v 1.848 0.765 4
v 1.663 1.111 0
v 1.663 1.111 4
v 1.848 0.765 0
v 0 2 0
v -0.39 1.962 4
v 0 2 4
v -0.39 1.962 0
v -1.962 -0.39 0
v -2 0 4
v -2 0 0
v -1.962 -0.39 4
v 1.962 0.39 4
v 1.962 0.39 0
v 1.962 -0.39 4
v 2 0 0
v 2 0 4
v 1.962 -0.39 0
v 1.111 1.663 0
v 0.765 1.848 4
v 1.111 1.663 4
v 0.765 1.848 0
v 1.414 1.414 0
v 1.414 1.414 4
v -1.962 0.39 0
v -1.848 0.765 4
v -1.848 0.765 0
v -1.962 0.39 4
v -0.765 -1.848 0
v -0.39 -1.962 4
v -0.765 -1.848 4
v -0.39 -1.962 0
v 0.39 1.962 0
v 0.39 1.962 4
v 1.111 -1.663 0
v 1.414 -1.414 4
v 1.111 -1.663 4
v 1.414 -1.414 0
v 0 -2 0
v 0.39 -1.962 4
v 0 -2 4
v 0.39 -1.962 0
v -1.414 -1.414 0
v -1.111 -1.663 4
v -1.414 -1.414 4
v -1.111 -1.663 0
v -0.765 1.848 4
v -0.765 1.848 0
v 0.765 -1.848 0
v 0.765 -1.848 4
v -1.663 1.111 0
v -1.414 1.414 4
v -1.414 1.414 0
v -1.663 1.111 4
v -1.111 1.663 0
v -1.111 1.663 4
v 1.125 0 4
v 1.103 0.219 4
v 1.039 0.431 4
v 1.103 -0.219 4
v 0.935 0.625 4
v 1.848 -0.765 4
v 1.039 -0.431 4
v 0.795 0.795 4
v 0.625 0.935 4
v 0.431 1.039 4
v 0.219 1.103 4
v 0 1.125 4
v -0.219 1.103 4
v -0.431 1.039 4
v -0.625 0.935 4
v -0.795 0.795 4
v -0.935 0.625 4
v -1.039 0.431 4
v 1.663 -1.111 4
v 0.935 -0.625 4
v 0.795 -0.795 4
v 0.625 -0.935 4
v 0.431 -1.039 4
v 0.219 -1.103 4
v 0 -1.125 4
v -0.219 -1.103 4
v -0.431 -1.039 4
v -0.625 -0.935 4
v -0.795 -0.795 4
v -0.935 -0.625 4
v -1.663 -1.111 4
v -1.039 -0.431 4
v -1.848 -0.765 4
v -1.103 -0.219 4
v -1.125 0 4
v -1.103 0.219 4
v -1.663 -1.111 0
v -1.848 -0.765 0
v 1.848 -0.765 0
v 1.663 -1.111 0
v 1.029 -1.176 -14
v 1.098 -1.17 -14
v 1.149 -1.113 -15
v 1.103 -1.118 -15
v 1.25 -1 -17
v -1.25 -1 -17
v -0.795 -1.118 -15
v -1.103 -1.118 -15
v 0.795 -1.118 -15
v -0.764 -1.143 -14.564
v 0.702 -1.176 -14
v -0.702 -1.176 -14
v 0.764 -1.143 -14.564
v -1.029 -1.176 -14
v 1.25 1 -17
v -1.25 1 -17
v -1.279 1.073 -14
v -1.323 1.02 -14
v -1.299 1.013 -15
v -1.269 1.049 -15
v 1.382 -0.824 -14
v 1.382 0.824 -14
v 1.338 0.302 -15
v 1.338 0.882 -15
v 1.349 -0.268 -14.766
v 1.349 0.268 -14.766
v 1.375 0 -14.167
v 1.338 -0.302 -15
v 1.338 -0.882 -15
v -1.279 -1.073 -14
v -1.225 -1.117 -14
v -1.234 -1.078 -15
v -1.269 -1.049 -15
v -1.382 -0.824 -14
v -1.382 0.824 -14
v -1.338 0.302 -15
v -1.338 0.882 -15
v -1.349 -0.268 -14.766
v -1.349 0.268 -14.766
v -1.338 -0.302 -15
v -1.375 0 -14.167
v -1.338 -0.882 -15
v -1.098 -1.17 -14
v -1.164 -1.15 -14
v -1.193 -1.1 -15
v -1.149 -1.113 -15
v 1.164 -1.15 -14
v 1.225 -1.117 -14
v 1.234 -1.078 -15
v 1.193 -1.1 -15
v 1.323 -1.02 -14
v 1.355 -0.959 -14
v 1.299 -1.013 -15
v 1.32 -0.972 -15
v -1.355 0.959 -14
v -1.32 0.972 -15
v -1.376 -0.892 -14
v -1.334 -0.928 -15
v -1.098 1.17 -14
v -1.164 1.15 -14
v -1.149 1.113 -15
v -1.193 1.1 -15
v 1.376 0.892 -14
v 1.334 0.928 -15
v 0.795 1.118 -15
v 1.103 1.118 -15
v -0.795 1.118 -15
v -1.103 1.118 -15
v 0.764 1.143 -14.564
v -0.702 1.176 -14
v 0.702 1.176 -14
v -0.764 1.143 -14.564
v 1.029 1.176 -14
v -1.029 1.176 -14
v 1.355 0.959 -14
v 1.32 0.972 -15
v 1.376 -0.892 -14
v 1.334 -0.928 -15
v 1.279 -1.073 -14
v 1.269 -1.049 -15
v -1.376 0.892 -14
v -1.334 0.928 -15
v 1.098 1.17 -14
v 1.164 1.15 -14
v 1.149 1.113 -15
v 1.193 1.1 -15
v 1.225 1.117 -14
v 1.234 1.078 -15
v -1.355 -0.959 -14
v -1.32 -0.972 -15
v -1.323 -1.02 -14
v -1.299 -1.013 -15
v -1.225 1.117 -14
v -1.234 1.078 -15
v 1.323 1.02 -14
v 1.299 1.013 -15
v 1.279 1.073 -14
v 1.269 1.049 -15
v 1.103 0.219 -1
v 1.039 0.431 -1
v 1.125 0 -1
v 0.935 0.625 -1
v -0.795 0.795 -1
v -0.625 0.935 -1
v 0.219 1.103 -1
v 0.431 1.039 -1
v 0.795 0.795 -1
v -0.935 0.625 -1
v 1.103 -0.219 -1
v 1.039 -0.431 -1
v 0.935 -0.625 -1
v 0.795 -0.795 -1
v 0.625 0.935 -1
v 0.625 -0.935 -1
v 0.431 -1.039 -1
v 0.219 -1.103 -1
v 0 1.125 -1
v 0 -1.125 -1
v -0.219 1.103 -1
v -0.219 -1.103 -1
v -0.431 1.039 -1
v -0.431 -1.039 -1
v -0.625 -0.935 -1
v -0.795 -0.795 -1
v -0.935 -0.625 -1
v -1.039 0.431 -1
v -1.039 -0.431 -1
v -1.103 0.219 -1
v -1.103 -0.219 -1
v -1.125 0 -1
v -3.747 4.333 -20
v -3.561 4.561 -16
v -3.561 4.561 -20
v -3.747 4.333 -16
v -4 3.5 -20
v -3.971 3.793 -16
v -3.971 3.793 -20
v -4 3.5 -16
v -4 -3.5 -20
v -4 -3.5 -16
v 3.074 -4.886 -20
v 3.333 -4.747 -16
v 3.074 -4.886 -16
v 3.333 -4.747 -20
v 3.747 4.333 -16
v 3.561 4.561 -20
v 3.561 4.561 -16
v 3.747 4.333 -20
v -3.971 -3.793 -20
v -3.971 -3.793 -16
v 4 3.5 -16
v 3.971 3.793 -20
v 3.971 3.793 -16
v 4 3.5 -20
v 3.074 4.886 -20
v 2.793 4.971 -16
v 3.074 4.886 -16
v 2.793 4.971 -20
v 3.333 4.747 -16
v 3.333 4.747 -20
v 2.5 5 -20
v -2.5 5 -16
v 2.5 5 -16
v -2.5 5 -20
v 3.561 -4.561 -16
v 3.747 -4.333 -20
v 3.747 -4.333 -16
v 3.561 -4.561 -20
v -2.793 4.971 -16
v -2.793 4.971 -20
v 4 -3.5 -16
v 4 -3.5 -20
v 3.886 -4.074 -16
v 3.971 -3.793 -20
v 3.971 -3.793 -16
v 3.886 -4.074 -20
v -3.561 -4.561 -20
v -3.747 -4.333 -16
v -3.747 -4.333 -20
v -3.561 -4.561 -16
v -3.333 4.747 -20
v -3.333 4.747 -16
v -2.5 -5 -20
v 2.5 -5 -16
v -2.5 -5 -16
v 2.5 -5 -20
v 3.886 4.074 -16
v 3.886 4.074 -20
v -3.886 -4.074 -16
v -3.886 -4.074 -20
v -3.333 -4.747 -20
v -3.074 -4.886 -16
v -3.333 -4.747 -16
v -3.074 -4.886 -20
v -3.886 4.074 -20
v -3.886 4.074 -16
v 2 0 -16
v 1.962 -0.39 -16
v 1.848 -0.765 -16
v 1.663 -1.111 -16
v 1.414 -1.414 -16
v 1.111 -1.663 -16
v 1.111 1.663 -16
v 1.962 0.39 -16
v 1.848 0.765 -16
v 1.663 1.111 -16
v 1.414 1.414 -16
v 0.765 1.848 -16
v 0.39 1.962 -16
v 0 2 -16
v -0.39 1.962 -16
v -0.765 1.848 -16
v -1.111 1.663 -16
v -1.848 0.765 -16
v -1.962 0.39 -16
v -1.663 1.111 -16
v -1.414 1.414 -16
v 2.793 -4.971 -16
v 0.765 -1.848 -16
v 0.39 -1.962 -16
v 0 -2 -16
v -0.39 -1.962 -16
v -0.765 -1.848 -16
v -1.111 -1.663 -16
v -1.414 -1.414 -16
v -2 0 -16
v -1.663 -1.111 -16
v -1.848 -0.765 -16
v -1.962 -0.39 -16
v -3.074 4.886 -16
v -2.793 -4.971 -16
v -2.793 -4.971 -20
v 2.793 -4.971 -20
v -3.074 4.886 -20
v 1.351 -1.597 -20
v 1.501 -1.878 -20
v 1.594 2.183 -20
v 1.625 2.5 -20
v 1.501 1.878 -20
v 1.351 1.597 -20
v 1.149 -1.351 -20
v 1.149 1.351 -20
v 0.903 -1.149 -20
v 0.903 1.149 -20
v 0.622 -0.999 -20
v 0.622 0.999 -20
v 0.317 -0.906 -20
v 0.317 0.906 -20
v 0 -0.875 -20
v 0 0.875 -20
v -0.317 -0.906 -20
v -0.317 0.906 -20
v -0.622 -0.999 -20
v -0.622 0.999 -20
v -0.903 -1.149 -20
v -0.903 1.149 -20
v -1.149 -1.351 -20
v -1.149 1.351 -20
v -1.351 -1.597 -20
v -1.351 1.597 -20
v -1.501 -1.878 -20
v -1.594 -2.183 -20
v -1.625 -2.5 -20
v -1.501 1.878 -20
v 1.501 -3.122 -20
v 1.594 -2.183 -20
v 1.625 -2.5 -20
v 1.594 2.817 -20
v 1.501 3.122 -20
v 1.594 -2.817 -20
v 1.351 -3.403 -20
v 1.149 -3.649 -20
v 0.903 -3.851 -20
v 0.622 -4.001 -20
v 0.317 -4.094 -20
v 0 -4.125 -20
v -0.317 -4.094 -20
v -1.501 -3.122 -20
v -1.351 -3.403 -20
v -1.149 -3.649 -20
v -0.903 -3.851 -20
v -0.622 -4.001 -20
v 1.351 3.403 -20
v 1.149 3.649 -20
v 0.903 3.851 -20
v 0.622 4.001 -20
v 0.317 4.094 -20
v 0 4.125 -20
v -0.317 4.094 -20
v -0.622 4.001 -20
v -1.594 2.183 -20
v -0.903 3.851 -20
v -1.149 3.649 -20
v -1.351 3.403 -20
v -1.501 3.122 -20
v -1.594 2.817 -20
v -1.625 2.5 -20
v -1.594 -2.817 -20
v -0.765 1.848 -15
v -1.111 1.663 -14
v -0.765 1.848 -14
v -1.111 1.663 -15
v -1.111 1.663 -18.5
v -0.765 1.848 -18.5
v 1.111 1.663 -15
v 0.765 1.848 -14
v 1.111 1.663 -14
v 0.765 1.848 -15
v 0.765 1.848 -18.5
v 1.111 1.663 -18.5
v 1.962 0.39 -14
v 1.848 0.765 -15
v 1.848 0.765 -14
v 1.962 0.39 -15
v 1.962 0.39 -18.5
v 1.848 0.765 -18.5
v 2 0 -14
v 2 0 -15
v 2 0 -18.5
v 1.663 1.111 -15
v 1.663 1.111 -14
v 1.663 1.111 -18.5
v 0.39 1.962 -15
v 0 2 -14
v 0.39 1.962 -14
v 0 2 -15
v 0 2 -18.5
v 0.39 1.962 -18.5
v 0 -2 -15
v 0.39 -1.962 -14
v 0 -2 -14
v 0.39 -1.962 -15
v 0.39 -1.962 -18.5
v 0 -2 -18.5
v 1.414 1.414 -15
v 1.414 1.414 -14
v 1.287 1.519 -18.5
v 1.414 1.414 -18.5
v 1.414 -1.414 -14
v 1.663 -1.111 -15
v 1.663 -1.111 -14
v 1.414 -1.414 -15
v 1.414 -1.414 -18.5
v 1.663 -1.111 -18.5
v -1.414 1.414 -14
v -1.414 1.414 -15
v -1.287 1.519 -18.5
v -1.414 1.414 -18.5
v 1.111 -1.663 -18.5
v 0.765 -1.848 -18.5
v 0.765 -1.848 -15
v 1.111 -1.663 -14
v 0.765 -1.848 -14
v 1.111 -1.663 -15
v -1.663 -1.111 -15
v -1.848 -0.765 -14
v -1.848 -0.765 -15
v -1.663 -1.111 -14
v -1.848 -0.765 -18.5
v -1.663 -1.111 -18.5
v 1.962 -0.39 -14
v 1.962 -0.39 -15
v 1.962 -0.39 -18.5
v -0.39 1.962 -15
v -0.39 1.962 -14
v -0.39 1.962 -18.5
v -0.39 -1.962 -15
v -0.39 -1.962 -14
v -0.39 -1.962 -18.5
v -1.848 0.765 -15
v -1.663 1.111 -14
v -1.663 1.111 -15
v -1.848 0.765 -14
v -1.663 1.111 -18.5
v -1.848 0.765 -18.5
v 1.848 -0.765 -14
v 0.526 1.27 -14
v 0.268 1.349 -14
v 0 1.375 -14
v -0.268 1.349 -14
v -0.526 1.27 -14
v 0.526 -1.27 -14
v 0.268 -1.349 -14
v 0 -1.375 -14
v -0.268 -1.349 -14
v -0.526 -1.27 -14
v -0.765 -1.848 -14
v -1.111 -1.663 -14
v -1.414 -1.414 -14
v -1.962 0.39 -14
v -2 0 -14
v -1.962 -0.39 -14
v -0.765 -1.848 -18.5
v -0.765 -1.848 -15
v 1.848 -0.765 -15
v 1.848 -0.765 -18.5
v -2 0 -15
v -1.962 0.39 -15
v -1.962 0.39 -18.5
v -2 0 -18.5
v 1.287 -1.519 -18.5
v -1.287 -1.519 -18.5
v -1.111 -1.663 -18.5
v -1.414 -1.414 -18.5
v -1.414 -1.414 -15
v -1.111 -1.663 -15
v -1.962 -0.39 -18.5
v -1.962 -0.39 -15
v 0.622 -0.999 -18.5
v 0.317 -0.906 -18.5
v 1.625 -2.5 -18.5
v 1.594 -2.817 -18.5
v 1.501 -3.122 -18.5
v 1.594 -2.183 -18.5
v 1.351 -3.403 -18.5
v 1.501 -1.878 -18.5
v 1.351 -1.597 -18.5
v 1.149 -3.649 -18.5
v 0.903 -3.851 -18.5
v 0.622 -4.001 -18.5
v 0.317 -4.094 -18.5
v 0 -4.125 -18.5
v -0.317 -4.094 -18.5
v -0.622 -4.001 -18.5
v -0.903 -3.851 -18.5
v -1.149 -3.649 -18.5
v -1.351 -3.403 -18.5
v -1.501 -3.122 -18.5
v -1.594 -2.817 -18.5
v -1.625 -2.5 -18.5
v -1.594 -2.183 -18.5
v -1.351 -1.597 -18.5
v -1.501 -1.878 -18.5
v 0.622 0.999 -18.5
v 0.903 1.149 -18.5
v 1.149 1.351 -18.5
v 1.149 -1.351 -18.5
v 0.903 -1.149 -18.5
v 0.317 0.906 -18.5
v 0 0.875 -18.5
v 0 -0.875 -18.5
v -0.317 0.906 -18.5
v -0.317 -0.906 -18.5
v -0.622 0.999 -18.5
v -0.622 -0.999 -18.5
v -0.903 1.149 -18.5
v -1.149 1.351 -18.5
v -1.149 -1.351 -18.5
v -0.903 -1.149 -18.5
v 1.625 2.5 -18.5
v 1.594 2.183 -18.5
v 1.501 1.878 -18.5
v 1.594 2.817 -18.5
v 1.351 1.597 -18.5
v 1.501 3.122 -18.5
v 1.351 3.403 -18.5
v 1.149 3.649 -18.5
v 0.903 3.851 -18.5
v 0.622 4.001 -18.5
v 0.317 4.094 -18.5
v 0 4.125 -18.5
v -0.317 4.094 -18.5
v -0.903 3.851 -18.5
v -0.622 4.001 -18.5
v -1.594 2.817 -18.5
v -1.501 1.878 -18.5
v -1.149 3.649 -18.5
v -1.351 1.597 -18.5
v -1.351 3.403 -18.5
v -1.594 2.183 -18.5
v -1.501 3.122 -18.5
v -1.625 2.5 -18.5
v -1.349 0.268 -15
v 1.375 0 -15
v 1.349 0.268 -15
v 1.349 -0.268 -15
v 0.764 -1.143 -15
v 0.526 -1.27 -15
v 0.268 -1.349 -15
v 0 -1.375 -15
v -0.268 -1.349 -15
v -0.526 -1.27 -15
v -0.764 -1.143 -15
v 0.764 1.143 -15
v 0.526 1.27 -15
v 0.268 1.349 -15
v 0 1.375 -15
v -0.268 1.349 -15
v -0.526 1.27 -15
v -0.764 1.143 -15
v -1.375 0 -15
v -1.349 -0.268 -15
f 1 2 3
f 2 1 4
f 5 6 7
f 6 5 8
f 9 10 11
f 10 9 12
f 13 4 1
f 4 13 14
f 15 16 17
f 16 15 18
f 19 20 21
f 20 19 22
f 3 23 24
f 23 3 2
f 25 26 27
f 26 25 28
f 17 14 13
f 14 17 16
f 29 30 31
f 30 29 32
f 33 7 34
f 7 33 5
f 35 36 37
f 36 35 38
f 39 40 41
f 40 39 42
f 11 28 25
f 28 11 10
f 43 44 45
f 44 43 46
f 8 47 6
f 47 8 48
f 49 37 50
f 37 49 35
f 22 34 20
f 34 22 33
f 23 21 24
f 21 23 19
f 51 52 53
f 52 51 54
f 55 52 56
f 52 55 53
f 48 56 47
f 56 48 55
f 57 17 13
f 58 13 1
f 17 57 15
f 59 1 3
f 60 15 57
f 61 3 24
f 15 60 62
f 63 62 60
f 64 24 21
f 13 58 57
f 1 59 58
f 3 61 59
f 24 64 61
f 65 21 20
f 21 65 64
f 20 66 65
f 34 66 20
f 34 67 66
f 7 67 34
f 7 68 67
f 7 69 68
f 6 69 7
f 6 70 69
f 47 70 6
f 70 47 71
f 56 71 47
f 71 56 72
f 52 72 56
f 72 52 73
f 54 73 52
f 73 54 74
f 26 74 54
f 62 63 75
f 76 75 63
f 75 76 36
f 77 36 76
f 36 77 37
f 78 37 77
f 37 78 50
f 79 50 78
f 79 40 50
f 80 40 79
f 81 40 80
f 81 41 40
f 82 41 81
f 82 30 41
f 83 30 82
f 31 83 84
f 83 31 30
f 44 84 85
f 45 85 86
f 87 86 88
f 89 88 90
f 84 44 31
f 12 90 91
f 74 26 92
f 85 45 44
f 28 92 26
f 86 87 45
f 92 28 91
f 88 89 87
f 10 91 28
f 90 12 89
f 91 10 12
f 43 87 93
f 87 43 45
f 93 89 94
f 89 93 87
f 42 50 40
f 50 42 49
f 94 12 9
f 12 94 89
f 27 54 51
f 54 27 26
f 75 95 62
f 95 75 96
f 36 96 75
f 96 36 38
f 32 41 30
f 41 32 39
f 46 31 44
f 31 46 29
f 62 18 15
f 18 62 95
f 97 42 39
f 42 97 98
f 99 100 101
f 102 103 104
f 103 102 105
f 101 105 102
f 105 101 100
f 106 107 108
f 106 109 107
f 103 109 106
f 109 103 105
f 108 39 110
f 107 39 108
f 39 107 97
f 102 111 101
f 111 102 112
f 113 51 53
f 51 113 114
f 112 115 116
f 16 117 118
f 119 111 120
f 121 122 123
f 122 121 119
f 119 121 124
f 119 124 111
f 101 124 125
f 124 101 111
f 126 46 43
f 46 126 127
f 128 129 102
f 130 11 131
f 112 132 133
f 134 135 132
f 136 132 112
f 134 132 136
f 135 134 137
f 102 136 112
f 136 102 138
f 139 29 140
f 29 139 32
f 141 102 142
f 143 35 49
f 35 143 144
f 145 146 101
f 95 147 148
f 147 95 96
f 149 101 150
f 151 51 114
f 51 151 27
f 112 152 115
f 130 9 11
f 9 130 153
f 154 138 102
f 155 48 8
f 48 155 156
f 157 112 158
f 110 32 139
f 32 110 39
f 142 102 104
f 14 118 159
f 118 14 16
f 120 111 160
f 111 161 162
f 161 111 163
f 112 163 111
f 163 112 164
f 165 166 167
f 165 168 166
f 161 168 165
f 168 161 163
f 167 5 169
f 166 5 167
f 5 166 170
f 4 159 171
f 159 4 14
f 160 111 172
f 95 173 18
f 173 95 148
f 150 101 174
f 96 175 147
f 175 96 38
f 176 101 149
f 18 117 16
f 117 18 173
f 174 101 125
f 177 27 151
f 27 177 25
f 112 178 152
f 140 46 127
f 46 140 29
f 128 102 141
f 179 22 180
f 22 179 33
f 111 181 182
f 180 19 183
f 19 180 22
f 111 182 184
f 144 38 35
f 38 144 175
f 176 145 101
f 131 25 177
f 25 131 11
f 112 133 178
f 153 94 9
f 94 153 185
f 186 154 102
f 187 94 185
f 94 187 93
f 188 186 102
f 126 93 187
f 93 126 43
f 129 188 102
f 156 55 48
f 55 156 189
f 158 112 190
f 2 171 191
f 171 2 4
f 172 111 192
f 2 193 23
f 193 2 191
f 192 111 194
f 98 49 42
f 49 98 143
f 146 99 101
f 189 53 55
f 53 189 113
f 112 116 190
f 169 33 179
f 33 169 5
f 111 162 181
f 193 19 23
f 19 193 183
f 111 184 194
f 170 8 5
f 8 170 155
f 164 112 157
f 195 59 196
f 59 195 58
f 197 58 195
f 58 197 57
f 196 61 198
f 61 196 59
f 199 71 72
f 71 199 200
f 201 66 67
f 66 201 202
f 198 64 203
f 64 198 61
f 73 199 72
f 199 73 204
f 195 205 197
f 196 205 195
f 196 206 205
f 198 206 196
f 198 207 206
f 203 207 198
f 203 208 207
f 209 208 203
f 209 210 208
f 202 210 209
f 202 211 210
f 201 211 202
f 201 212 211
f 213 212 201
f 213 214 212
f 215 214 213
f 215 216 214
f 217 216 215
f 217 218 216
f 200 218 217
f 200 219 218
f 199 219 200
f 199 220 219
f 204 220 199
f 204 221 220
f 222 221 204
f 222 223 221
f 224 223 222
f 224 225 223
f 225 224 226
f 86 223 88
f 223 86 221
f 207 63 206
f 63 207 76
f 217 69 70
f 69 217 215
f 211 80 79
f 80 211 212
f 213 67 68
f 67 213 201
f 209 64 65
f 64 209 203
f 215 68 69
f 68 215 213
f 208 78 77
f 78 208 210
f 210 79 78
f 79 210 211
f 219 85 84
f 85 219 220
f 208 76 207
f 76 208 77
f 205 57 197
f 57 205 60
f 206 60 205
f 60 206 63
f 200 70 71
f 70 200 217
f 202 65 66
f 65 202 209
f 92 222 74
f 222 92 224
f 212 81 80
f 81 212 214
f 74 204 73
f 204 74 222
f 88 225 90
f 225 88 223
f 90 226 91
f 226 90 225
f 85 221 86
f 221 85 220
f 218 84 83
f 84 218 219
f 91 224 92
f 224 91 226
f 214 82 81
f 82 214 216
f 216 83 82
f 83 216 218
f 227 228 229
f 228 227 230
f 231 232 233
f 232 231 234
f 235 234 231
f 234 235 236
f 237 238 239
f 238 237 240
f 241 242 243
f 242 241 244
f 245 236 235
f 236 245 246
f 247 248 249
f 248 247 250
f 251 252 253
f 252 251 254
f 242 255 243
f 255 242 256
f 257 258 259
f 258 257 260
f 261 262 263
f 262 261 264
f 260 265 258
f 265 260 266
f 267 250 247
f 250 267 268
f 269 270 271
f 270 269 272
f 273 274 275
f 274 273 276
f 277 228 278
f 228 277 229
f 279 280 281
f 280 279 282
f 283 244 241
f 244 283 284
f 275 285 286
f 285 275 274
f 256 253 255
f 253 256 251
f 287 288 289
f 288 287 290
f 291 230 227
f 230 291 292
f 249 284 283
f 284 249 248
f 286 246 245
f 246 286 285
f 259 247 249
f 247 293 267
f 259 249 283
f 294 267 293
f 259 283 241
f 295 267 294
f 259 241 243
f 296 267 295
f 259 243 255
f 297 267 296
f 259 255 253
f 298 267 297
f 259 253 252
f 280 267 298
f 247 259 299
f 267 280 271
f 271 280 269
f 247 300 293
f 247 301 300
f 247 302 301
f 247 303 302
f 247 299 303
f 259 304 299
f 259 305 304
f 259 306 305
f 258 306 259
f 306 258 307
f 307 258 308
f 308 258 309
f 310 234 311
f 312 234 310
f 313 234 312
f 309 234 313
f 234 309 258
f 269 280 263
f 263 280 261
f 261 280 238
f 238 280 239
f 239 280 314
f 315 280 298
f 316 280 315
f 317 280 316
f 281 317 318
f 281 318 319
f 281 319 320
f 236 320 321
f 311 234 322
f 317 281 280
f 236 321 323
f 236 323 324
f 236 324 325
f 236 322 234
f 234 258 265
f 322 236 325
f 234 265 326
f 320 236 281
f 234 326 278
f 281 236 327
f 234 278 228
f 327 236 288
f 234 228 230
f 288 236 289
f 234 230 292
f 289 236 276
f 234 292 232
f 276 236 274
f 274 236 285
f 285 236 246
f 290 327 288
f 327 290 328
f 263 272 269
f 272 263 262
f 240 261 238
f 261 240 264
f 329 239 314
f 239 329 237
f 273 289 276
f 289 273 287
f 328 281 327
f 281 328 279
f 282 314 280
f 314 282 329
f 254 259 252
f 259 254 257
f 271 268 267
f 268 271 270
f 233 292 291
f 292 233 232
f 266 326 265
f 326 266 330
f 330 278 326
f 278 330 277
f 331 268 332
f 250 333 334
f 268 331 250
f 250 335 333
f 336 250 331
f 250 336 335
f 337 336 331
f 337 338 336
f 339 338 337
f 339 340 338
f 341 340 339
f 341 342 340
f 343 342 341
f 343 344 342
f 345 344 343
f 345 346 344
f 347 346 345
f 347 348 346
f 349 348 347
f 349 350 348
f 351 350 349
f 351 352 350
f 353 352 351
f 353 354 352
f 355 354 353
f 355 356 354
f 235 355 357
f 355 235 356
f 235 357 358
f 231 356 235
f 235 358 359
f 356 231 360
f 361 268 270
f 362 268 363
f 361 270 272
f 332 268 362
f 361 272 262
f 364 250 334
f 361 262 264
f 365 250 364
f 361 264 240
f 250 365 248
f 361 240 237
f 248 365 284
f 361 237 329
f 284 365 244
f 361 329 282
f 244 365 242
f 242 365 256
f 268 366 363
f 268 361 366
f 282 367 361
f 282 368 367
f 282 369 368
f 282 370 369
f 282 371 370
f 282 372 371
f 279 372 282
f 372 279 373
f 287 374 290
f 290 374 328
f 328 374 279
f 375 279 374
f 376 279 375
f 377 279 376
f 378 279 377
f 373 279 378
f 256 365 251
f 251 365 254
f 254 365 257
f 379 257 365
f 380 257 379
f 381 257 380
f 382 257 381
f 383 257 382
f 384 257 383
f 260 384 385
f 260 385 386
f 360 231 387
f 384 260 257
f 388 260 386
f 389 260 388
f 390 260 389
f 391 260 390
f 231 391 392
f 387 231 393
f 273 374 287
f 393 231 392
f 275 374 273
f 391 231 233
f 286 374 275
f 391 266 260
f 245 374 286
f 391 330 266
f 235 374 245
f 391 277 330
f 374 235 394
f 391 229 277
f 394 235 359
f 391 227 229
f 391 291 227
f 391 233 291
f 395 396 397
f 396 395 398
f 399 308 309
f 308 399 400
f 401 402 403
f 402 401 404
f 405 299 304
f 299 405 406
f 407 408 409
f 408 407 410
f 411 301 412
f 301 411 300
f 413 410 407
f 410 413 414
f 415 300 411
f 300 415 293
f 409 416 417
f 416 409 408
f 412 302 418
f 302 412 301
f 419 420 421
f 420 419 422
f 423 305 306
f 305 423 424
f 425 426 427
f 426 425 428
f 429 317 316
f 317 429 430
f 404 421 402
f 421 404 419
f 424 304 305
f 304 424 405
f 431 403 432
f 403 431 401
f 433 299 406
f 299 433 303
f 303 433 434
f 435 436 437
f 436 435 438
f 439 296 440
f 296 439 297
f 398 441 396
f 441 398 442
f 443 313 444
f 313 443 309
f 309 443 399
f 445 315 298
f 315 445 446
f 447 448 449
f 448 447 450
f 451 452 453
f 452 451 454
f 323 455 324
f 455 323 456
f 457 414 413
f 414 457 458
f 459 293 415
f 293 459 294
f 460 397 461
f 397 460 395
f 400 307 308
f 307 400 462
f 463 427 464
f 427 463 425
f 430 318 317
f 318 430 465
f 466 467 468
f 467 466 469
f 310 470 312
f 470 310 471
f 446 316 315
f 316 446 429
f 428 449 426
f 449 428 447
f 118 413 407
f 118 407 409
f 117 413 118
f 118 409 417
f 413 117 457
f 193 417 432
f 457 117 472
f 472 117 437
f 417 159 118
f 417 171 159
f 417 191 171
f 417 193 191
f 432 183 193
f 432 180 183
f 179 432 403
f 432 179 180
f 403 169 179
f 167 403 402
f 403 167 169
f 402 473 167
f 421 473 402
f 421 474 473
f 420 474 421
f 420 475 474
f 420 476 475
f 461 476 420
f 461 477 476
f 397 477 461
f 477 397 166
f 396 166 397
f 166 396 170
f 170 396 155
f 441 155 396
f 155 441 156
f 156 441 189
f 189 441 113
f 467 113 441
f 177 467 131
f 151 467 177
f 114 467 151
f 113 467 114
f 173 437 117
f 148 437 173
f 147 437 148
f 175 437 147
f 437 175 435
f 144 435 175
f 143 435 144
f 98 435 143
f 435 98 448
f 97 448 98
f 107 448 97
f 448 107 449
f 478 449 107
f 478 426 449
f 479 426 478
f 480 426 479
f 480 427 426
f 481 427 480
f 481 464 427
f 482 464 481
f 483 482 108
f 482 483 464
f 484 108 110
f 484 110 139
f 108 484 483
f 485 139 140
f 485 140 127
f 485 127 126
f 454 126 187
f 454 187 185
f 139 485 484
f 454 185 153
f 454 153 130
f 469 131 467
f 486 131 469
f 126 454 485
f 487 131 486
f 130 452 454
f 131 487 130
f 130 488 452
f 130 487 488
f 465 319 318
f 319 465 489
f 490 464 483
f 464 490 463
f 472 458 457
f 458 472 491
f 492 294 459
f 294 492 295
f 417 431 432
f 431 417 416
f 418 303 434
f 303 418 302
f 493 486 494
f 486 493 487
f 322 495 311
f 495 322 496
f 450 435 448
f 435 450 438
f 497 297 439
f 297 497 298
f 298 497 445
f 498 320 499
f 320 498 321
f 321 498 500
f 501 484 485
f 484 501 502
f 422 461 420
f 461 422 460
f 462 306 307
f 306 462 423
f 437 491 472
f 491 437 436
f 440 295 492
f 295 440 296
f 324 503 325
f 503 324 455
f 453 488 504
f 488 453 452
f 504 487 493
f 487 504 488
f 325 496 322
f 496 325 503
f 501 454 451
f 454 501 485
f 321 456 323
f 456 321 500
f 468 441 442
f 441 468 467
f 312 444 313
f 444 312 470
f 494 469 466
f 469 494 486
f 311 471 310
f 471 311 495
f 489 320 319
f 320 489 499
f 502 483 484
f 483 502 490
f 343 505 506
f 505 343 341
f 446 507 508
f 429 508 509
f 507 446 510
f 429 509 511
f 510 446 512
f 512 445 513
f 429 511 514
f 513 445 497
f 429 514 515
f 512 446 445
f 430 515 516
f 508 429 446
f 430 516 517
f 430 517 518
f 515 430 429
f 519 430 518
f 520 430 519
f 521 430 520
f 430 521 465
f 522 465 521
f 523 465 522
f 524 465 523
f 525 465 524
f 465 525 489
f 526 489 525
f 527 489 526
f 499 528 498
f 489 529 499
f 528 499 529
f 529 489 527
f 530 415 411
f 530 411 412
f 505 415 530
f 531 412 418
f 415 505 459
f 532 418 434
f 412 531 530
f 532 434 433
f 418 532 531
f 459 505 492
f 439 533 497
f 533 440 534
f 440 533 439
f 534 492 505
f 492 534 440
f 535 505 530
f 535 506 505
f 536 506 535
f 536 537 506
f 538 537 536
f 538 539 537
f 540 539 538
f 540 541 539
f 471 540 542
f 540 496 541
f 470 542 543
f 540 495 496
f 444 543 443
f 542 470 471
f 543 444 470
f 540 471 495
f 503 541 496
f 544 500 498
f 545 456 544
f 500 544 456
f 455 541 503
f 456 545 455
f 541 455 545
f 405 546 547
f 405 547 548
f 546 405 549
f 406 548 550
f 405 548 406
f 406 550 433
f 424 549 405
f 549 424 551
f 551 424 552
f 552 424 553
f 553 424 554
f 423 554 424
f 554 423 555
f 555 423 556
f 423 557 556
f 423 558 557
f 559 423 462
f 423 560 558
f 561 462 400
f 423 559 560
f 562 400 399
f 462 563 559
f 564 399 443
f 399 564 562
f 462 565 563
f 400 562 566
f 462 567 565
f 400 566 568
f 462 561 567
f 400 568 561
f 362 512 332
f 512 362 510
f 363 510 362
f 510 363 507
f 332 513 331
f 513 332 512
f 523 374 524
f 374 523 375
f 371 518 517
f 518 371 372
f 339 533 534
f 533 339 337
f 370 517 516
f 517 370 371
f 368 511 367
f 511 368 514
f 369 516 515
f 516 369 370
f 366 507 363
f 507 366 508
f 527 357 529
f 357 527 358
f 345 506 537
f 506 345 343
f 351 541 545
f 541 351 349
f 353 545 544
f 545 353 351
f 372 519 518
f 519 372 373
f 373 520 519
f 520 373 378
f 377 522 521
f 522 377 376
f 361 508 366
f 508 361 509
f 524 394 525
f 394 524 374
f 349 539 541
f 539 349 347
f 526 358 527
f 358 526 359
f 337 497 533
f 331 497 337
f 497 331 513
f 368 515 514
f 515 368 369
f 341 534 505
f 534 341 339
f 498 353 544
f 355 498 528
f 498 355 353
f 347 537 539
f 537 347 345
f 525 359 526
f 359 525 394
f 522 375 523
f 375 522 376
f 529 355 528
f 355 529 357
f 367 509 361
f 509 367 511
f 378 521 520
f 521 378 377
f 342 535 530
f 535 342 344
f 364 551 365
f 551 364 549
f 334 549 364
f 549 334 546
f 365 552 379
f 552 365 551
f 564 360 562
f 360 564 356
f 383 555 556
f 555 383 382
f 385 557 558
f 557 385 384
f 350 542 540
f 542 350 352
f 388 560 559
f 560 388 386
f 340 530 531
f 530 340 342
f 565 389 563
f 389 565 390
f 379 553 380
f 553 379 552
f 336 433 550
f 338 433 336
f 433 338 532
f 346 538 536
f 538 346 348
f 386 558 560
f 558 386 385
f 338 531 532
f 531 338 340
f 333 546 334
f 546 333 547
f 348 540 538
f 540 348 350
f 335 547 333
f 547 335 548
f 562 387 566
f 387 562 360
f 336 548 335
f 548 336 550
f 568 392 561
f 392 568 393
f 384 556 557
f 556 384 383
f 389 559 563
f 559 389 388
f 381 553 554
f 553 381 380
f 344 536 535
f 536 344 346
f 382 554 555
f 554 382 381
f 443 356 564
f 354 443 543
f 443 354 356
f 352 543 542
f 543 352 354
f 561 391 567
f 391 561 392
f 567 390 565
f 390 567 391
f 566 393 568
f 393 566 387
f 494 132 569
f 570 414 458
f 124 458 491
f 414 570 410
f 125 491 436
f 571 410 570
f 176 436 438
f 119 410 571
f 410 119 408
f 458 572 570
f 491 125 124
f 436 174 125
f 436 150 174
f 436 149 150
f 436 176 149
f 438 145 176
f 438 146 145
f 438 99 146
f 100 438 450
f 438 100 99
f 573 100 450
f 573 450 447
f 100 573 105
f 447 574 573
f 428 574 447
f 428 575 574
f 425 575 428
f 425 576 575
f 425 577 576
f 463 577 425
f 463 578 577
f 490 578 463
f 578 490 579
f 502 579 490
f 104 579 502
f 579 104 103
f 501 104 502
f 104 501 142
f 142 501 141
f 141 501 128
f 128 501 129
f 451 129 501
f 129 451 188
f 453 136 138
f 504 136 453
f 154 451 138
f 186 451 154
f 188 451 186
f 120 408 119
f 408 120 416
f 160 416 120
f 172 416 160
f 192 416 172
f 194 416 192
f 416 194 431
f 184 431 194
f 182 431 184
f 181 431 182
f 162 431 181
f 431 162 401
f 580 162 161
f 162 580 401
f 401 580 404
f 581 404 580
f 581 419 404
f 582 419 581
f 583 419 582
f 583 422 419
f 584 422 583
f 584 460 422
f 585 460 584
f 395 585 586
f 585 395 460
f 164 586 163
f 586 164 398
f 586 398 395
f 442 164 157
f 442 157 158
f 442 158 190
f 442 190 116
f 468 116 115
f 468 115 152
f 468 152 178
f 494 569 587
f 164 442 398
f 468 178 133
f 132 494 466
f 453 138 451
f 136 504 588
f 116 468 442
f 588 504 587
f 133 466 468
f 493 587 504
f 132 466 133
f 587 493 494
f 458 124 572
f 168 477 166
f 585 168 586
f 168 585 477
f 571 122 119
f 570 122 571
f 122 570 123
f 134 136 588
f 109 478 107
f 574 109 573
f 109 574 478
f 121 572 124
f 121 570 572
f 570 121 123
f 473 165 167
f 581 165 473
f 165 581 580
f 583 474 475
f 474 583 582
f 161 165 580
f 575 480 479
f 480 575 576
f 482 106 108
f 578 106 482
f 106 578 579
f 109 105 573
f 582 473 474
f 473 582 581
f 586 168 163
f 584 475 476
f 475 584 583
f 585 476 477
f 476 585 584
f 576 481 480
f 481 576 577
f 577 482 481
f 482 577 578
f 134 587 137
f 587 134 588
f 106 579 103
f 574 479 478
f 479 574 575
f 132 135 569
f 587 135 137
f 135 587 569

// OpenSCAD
// file: config_10cm.scad
// ============================================
// NuiBone - 10cm版 共通設定ファイル
// ============================================
// 10cmぬいぐるみ用ロボット骨格の寸法設定
// ※サーボはSG90では大きすぎるため、
//   より小型のサーボを推奨
// ============================================

// --- ぬいぐるみサイズ制約 ---
nui_height = 100;        // ぬいぐるみ全高 (mm)
nui_body_width = 28;     // 胴体最大幅 (mm)
nui_body_depth = 18;     // 胴体最大厚み (mm)

// --- 骨格寸法 ---
bone_thickness = 2.0;    // 骨格基本厚み (mm)
bone_width = 2.5;        // 骨格基本幅 (mm)

// 胴体フレーム
body_height = 30;        // 胴体高さ (mm)
body_width = 24;         // 胴体幅 (mm)
body_depth = 14;         // 胴体奥行き (mm)

// 肩
shoulder_width = 6;      // 肩部品幅 (mm)
shoulder_offset = 10;    // 肩の高さ位置（胴体上端から）

// 腕
arm_length = 22;         // 腕の長さ (mm)
arm_width = 3;           // 腕の幅 (mm)
arm_thickness = 1.5;     // 腕の厚み (mm)

// 足
foot_width = 8;          // 足幅 (mm)
foot_length = 10;        // 足長さ (mm)
foot_height = 4;         // 足高さ (mm)
leg_length = 20;         // 脚の長さ (mm)

// --- サーボ選択 ---
// 10cm版では以下のいずれかを推奨:
// 1. SG51R (5g) - 最小クラス
// 2. HK-5320 (3.7g) - 超小型
// 3. 自作リニアアクチュエータ

// SG51R寸法 (参考)
servo_width = 6.0;       // サーボ幅 (mm)
servo_height = 15.0;     // サーボ高さ (mm)
servo_depth = 12.0;      // サーボ奥行き (mm)
servo_shaft_height = 3;  // 出力軸高さ (mm)
servo_shaft_dia = 3.0;   // 出力軸直径 (mm)

// --- 代替案: 振動モーター版 ---
// サーボの代わりに偏心モーターで「ぷるぷる」動作
vibration_motor_dia = 6; // 振動モーター直径 (mm)
vibration_motor_len = 12;// 振動モーター長さ (mm)

// --- 磁石・重り（10cm版用）---
magnet_dia = 3;          // ネオジム磁石直径 (mm) - より小さい
magnet_height = 1.5;     // ネオジム磁石高さ (mm)
weight_hole_dia = 4;     // 重り穴直径 (mm)

// --- 呼吸機構（10cm版）---
breath_stroke = 2;       // 呼吸ストローク (mm)
breath_plate_size = 10;  // 呼吸プレートサイズ (mm)

// --- 印刷設定 ---
wall_thick = 0.8;        // 壁厚み (mm) - より薄く
tolerance = 0.25;        // 組み立て公差 (mm)
$fn = 32;                // 円の分割数

// --- 色設定（プレビュー用）---
color_bone = [0.9, 0.9, 0.85];
color_servo = [0.2, 0.2, 0.3];
color_magnet = [0.7, 0.7, 0.7];

// ============================================
// 10cm版の制約と推奨事項
// ============================================
//
// 【課題】
// - SG90 (12.2mm幅) は10cmぬいぐるみには大きすぎる
// - 電池も単3では大きい
//
// 【推奨構成】
// 1. マイクロサーボ版
//    - サーボ: SG51R または HK-5320
//    - 電源: LiPo 1S (3.7V) 100-200mAh
//    - 制御: ESP32-C3 または Seeed XIAO
//
// 2. 振動モーター版（簡易版）
//    - 振動モーター × 2-3個
//    - 「ぷるぷる」動作で生命感を表現
//    - サーボ制御不要で省スペース
//
// 3. SMA (形状記憶合金) 版
//    - 超薄型で柔軟
//    - ゆっくりした動きに最適
//    - 呼吸表現に理想的
// ============================================
// main file
// ============================================
// NuiBone - 10cm版 足パーツ
// ============================================
// 小型磁石と重りで直立補助
// ============================================

include <config_10cm.scad>

// --- 足アセンブリ（10cm版）---
module foot_assembly_10cm() {
    // 脚部
    leg_bone_10cm();

    // 足裏
    translate([0, 0, -leg_length])
        foot_base_10cm();
}

// --- 脚ボーン（10cm版）---
module leg_bone_10cm() {
    difference() {
        union() {
            // 股関節接続部
            cylinder(h=4, d=4);

            // 脚本体
            hull() {
                cylinder(h=2, d=4);
                translate([0, 0, -leg_length + foot_height])
                    cube([bone_width, bone_thickness, 2], center=true);
            }
        }

        // 股関節穴
        translate([0, 0, -1])
            cylinder(h=6, d=2 + tolerance);
    }
}

// --- 足裏ベース（10cm版）---
module foot_base_10cm() {
    magnet_count = 2;  // 片足あたりの磁石数

    difference() {
        union() {
            // 足裏本体（丸みを帯びた形状）
            hull() {
                translate([-foot_width/2 + 1.5, -foot_length/2 + 1.5, 0])
                    cylinder(h=foot_height, r=1.5);
                translate([foot_width/2 - 1.5, -foot_length/2 + 1.5, 0])
                    cylinder(h=foot_height, r=1.5);
                translate([-foot_width/2 + 1.5, foot_length/2 - 1.5, 0])
                    cylinder(h=foot_height, r=1.5);
                translate([foot_width/2 - 1.5, foot_length/2 - 1.5, 0])
                    cylinder(h=foot_height, r=1.5);
            }

            // 脚接続ボス
            translate([0, 0, foot_height])
                cylinder(h=2, d=bone_width + 1.5);
        }

        // 磁石穴（前後に2個）
        for (y = [-foot_length/4, foot_length/4]) {
            translate([0, y, -0.5])
                cylinder(h=magnet_height + 0.5, d=magnet_dia + tolerance);
        }

        // 重り穴（中央）
        translate([0, 0, magnet_height])
            cylinder(h=foot_height - magnet_height + 1, d=weight_hole_dia);

        // 脚接続穴
        translate([0, 0, foot_height - 1])
            cylinder(h=4, d=bone_width + tolerance);
    }
}

// --- 足裏（磁石1個版）---
// さらに小さいぬいぐるみ用
module foot_base_10cm_single_magnet() {
    difference() {
        union() {
            // 足裏本体
            cylinder(h=foot_height, d=foot_width);

            // 脚接続ボス
            translate([0, 0, foot_height])
                cylinder(h=2, d=bone_width + 1.5);
        }

        // 磁石穴（1個）
        translate([0, 0, -0.5])
            cylinder(h=magnet_height + 0.5, d=magnet_dia + tolerance);

        // 脚接続穴
        translate([0, 0, foot_height - 1])
            cylinder(h=4, d=bone_width + tolerance);
    }
}

// --- 足全体（左右セット）---
module feet_pair_10cm() {
    // 左足
    foot_assembly_10cm();

    // 右足（ミラー）
    translate([foot_width + 8, 0, 0])
        mirror([1, 0, 0])
            foot_assembly_10cm();
}

// --- 印刷用パーツ展開 ---
module foot_parts_10cm_for_print() {
    // 左脚
    translate([0, 0, leg_length])
        leg_bone_10cm();

    // 右脚
    translate([10, 0, leg_length])
        leg_bone_10cm();

    // 左足裏
    translate([20, 0, 0])
        foot_base_10cm();

    // 右足裏
    translate([32, 0, 0])
        foot_base_10cm();

    // 単一磁石版（オプション）
    translate([44, 0, 0])
        foot_base_10cm_single_magnet();

    translate([54, 0, 0])
        foot_base_10cm_single_magnet();
}

// --- メイン出力 ---
foot_assembly_10cm();

// 印刷用（コメントアウトで切替）
// foot_parts_10cm_for_print();

// 左右ペア表示
// feet_pair_10cm();
